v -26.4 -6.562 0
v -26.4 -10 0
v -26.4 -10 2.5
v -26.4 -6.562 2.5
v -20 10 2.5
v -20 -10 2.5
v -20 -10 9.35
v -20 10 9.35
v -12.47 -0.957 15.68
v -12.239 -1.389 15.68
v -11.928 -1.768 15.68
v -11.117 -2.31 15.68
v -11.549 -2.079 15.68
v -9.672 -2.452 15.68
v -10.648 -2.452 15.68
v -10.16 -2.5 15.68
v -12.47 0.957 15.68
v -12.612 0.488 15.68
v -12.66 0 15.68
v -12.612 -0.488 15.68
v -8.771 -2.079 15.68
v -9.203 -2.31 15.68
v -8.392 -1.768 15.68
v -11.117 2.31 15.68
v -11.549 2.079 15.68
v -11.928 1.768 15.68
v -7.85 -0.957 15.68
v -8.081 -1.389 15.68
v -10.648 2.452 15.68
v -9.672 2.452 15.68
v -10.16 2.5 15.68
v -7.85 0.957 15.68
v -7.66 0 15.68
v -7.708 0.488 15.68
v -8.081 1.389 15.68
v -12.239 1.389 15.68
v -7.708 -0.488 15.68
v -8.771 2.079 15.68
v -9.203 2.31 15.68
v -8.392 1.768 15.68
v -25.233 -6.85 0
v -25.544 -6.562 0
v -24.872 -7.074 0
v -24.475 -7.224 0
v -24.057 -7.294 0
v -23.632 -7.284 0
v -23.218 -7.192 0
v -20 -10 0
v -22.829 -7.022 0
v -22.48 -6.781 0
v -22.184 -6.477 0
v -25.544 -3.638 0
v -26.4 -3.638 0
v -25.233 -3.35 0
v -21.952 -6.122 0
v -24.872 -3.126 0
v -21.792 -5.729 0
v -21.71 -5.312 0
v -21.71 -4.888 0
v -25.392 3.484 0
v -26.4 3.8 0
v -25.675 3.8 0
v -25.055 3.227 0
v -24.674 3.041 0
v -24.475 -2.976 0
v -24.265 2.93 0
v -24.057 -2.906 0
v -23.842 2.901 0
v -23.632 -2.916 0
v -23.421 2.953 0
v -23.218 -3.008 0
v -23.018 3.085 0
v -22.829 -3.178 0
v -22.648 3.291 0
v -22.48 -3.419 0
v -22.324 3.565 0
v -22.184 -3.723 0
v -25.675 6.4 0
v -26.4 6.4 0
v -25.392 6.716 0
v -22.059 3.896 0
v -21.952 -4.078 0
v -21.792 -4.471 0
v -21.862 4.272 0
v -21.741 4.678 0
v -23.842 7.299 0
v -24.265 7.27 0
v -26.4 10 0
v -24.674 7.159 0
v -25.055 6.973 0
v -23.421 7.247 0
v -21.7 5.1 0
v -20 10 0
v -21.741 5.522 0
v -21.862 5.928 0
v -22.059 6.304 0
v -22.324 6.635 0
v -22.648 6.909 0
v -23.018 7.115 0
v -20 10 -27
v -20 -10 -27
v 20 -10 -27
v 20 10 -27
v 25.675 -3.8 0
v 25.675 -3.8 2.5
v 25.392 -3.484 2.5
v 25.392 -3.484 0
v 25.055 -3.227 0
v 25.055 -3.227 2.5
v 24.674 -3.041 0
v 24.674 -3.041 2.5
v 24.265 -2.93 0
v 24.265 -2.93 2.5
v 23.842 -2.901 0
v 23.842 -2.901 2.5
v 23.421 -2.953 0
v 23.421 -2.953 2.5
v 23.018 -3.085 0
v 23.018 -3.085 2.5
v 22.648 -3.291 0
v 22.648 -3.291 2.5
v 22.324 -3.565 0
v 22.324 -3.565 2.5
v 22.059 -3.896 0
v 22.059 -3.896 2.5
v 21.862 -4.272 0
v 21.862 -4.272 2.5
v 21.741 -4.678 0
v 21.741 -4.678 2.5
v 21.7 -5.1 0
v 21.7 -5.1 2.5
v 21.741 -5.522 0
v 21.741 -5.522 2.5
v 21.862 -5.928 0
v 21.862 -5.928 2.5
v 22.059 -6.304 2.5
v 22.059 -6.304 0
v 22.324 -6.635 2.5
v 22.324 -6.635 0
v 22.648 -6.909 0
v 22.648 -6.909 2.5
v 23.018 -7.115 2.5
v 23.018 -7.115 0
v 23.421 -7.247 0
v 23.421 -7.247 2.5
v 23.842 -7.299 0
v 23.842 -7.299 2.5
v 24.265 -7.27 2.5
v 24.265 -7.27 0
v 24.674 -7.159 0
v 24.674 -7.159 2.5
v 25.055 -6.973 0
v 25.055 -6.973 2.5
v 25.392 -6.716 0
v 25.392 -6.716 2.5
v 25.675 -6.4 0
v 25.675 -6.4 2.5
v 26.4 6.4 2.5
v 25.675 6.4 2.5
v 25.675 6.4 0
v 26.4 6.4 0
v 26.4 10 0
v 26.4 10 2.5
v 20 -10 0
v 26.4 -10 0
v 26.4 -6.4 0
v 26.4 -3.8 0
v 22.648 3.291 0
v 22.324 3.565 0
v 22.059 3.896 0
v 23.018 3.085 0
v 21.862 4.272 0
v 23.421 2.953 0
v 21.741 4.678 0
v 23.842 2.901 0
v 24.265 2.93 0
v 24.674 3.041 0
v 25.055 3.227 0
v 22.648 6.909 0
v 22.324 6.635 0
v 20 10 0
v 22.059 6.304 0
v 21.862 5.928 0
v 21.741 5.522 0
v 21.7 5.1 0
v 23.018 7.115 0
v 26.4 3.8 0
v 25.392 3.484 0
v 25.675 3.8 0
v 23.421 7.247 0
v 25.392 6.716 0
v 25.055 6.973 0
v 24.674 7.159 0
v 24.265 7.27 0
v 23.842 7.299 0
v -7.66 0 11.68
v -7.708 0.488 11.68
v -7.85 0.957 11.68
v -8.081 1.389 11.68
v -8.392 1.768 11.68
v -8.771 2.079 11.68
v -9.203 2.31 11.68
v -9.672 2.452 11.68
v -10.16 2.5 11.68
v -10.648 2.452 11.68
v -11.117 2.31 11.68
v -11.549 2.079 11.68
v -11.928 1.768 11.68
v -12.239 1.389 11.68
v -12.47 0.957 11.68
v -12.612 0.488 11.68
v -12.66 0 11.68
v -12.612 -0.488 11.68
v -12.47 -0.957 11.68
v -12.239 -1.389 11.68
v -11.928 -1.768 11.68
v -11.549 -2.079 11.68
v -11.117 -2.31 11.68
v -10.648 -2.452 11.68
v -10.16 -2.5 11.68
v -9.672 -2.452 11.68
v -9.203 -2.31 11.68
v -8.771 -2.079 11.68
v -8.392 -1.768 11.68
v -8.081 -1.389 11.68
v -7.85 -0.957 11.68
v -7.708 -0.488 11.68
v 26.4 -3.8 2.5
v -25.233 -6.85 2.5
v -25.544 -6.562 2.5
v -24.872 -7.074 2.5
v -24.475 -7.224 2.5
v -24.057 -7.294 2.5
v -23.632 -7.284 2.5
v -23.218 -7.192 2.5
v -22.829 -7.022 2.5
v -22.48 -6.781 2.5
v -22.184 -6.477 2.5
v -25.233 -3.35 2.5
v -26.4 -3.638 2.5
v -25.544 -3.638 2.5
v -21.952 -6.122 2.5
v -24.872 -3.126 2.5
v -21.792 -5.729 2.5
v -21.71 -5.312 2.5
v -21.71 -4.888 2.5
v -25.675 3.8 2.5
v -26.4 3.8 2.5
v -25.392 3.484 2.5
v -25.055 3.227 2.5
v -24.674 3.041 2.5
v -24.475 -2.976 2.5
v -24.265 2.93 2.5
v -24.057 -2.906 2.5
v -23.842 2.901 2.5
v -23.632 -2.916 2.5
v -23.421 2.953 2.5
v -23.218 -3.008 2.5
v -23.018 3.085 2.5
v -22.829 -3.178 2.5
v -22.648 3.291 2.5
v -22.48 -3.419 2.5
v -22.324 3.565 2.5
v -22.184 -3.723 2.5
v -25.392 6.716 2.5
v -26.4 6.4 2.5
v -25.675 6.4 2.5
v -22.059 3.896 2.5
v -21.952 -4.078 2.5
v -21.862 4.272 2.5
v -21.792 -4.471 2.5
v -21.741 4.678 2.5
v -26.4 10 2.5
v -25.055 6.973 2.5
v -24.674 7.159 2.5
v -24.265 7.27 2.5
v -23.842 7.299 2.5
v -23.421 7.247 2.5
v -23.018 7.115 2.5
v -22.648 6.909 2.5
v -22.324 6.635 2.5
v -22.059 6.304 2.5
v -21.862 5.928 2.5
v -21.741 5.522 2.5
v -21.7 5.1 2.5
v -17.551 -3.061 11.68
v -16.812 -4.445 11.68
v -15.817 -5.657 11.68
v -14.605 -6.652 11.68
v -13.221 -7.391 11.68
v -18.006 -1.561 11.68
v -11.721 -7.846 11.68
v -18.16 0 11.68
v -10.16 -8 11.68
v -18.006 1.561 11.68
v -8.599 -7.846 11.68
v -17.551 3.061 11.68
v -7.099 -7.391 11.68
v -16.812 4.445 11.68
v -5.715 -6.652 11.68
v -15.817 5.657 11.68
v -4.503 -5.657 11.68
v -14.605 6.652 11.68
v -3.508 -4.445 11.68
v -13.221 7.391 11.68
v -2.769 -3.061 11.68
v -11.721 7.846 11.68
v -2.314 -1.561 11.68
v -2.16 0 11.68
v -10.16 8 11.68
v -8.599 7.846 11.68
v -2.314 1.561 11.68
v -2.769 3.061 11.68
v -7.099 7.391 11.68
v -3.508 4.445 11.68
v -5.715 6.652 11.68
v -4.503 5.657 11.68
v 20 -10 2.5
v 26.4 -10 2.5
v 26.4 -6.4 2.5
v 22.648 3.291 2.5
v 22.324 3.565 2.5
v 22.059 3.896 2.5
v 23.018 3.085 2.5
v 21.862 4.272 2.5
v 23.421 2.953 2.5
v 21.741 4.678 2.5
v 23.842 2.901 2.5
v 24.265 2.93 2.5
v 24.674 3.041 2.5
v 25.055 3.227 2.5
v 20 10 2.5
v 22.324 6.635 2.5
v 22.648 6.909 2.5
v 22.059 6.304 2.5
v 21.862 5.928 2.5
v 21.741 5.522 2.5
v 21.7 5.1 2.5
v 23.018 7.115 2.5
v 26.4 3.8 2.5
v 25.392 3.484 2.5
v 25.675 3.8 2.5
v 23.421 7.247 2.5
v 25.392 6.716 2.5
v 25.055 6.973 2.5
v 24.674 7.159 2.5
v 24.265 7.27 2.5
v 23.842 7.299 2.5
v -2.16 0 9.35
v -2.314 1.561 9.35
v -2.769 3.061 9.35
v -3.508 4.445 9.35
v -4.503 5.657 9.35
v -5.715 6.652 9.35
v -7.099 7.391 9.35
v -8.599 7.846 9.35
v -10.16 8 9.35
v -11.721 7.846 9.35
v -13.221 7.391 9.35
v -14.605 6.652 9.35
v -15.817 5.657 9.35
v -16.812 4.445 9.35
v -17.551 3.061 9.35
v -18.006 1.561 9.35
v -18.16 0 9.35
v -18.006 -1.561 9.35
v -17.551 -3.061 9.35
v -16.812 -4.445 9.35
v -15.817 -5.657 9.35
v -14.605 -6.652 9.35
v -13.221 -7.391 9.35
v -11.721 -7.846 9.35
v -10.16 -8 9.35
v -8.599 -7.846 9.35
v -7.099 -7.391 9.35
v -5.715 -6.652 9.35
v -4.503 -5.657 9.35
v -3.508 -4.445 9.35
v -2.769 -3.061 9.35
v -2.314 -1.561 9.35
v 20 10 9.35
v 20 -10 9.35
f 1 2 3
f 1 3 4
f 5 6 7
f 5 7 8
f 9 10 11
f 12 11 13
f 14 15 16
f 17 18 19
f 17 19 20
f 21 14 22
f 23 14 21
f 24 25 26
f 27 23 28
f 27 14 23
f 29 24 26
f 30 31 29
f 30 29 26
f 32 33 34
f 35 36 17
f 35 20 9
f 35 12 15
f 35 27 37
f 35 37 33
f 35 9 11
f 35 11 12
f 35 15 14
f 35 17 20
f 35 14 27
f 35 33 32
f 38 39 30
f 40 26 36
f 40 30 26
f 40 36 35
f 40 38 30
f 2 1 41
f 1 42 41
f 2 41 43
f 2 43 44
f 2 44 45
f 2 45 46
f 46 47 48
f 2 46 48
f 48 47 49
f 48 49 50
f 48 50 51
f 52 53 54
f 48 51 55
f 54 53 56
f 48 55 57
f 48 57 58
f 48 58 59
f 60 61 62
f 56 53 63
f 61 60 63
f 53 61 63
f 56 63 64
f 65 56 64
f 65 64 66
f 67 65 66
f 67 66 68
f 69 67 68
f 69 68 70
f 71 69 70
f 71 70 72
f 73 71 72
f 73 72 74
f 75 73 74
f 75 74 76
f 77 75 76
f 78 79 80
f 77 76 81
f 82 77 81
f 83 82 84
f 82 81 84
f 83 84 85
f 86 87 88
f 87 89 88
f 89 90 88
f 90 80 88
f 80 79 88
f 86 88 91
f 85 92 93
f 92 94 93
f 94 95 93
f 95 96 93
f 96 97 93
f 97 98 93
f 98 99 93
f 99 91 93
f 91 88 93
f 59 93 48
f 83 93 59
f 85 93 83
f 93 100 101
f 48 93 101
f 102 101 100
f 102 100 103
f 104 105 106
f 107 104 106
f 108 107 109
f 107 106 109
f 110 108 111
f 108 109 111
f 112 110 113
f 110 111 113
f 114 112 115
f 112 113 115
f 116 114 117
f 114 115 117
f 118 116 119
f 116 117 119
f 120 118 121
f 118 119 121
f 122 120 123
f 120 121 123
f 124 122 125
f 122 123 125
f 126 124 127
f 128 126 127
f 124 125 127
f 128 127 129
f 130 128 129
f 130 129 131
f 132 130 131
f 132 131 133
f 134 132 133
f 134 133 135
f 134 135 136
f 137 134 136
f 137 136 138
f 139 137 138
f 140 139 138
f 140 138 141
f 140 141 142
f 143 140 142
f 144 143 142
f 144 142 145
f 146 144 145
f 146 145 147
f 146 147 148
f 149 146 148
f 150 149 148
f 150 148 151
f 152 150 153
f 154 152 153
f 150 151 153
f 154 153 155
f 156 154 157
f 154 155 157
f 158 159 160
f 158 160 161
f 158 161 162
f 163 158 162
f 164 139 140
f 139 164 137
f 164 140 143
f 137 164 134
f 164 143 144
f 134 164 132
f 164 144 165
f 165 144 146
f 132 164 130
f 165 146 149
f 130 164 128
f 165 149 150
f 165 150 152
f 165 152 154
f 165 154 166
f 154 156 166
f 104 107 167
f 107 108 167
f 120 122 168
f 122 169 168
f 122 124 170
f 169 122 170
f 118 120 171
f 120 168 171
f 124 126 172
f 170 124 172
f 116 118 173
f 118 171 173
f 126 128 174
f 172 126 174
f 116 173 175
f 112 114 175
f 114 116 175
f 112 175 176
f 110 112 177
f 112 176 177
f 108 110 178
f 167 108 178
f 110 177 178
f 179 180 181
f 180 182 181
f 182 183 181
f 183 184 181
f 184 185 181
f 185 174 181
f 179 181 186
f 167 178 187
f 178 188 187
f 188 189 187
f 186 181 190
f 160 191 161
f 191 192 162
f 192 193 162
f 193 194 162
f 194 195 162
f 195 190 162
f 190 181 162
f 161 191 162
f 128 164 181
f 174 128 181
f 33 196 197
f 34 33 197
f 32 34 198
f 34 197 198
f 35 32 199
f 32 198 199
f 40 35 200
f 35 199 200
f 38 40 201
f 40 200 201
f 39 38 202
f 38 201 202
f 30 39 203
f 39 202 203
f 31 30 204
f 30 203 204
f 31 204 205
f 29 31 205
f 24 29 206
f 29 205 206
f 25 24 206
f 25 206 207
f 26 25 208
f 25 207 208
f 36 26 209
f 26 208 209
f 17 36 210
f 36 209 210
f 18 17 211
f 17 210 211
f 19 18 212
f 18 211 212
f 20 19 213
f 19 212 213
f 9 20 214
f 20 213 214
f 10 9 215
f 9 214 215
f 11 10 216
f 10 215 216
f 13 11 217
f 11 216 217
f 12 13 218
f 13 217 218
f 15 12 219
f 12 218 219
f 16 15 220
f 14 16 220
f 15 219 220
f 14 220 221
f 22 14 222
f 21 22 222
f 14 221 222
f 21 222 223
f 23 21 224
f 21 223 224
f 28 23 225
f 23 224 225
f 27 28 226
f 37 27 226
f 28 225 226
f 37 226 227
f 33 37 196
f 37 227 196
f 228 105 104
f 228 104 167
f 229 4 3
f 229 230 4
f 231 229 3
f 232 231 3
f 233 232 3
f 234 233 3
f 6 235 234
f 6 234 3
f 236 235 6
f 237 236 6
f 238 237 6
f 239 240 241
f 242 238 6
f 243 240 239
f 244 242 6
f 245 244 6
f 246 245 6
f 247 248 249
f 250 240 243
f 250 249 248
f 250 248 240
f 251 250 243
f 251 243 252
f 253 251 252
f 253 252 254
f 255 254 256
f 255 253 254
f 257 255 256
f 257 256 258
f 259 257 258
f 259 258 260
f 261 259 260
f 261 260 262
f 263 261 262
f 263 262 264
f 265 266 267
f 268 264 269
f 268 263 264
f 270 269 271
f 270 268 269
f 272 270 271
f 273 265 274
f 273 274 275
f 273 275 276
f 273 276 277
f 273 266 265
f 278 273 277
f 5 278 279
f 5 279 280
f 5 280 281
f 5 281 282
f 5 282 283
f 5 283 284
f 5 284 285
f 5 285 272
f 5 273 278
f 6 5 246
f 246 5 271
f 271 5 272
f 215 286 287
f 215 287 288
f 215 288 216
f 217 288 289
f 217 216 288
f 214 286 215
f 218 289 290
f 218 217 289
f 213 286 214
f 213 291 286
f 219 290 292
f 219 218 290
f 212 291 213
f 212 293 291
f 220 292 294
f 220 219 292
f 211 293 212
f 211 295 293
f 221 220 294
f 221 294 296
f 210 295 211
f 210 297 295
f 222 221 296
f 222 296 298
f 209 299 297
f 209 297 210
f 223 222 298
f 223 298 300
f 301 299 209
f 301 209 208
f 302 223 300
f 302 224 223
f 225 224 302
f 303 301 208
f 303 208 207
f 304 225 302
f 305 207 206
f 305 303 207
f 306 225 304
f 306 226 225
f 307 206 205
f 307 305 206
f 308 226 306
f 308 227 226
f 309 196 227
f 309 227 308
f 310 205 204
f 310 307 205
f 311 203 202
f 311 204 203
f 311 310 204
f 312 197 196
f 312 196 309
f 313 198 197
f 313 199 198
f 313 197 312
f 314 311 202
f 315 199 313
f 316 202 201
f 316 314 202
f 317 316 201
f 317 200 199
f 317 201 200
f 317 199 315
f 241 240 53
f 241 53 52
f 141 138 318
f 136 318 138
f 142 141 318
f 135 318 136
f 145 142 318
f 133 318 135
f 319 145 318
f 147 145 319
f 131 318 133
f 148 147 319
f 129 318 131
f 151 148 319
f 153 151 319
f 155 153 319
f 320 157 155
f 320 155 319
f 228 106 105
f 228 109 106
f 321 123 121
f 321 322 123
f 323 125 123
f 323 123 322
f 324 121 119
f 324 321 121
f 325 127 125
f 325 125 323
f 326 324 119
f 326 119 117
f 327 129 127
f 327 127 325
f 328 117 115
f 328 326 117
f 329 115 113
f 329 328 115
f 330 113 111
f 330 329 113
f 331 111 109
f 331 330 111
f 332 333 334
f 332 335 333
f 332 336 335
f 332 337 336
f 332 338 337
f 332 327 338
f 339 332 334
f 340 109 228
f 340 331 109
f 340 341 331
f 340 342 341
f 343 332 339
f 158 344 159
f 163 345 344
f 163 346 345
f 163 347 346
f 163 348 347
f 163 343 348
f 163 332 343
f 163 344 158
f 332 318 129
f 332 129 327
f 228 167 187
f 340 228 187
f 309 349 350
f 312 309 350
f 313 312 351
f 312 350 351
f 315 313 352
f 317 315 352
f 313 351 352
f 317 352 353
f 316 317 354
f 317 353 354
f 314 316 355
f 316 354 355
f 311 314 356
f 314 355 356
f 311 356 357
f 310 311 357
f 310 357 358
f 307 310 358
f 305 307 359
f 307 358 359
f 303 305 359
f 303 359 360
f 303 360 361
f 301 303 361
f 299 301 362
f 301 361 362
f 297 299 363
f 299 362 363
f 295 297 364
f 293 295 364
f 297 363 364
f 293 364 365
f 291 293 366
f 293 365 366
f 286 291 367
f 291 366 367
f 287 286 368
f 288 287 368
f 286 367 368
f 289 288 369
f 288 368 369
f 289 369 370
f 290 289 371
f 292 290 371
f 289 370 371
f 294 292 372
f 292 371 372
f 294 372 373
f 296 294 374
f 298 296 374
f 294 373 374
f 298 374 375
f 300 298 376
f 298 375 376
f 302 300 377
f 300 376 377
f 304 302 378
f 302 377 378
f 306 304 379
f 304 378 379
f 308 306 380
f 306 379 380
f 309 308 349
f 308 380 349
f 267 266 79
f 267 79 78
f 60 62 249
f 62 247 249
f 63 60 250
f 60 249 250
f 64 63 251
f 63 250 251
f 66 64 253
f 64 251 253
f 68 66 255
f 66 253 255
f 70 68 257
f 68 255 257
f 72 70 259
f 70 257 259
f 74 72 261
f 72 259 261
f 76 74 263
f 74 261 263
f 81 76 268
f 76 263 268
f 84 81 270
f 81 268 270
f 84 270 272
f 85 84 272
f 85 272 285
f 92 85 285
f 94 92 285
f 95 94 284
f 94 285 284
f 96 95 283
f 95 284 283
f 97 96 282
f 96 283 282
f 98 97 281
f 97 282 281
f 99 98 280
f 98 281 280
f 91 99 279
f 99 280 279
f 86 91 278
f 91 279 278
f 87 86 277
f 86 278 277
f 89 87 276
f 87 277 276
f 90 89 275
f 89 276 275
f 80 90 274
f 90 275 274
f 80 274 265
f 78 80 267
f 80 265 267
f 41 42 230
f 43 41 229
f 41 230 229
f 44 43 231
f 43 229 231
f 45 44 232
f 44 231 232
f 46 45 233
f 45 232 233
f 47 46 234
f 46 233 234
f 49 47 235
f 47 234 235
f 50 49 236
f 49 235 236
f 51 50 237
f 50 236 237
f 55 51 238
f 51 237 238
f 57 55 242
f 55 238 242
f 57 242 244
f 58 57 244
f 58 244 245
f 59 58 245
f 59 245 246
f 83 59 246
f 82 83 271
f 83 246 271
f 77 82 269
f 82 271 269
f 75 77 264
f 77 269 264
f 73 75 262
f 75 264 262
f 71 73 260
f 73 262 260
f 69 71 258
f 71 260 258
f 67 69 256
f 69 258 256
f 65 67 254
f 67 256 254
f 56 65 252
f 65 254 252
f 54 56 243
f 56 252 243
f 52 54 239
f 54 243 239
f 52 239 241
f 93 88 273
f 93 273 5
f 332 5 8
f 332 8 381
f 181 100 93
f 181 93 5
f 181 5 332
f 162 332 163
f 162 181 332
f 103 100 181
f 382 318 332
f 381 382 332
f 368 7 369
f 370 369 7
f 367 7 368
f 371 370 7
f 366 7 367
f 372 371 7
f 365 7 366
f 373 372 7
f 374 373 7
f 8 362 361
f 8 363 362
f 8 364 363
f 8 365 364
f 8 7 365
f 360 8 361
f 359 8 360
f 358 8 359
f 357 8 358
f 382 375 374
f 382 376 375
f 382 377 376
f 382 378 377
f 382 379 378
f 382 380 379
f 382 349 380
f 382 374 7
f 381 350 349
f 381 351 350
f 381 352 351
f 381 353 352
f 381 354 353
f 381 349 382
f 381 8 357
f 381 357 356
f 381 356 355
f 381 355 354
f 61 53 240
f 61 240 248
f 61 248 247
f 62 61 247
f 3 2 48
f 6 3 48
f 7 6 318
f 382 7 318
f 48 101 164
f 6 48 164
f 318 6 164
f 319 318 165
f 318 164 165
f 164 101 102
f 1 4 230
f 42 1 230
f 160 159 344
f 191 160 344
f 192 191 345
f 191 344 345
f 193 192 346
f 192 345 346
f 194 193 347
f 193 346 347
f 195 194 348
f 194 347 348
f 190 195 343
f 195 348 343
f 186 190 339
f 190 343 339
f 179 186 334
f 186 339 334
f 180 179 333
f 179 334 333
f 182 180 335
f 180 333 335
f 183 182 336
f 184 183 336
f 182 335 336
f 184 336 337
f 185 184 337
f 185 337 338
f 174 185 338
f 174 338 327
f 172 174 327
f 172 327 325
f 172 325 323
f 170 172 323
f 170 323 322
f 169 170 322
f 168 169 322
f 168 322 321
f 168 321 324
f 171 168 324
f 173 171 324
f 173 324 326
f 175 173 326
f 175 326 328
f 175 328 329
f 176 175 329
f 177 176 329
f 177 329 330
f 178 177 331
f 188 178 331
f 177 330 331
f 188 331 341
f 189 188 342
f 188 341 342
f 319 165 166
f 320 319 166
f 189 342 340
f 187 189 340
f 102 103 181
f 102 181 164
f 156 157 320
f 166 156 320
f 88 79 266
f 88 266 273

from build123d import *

# Parameters (mm, degrees)
F0_W      = 52.8
F0_H      = 20
F1_DEPTH  = 2.5
F2_W      = 40
F2_H      = 20
F3_DEPTH  = 6.85
F4_W      = 40
F4_H      = 20
F5_DEPTH  = 27
F6_R      = 2.2
F7_DEPTH  = 2.5
F8_W      = 0.7251760651
F8_H      = 2.6
F8_W_2    = 0.8560355749
F8_H_2    = 2.9239568868
F9_DEPTH  = 4
F10_W     = 0.7251760651
F10_H     = 2.6
F11_DEPTH = 5
F12_R     = 8
F13_DEPTH = 2.33
F14_R     = 2.5
F15_DEPTH = 4


with BuildPart() as f1:
    # F0 (on Top) → F1 (new body)
    with BuildSketch(Plane.XY):
        Rectangle(F0_W, F0_H)
    extrude(amount=F1_DEPTH)

    # F2 (on face) → F3 (join)
    with BuildSketch(Plane.XY.offset(2.5)):
        Rectangle(F2_W, F2_H)
    extrude(amount=F3_DEPTH)

    # F4 (on face) → F5 (join)
    with BuildSketch(Plane(origin=(0, 0, 0), x_dir=(1, 0, 0), z_dir=(0, 0, -1))):
        Rectangle(F4_W, F4_H)
    extrude(amount=F5_DEPTH)

    # F6 (on face) → F7 (cut, through all)
    with BuildSketch(Plane.XY.offset(2.5)):
        with Locations((-23.9, 5.1)):
            Circle(F6_R)
        with Locations((-23.9, -5.1)):
            Circle(F6_R)
        with Locations((23.9, 5.1)):
            Circle(F6_R)
        with Locations((23.9, -5.1)):
            Circle(F6_R)
    extrude(amount=-F7_DEPTH, mode=Mode.SUBTRACT)

    # F8 (on face) → F9 (cut)
    with BuildSketch(Plane.XY.offset(2.5)):
        with Locations((-26.0374119675, 5.1)):
            Rectangle(F8_W, F8_H)
        with Locations((-25.9719822126, -5.1)):
            Rectangle(F8_W_2, F8_H_2)
    extrude(amount=-F9_DEPTH, mode=Mode.SUBTRACT)

    # F10 (on face) → F11 (cut)
    with BuildSketch(Plane.XY.offset(2.5)):
        with Locations((26.0374119675, 5.1)):
            Rectangle(F10_W, F10_H)
        with Locations((26.0374119675, -5.1)):
            Rectangle(F10_W, F10_H)
    extrude(amount=-F11_DEPTH, mode=Mode.SUBTRACT)

    # F12 (on face) → F13 (join)
    with BuildSketch(Plane.XY.offset(9.35)):
        with Locations((-10.16, 0)):
            Circle(F12_R)
    extrude(amount=F13_DEPTH)

    # F14 (on face) → F15 (join)
    with BuildSketch(Plane.XY.offset(11.68)):
        with Locations((-10.16, 0)):
            Circle(F14_R)
    extrude(amount=F15_DEPTH)


solid = f1.part
